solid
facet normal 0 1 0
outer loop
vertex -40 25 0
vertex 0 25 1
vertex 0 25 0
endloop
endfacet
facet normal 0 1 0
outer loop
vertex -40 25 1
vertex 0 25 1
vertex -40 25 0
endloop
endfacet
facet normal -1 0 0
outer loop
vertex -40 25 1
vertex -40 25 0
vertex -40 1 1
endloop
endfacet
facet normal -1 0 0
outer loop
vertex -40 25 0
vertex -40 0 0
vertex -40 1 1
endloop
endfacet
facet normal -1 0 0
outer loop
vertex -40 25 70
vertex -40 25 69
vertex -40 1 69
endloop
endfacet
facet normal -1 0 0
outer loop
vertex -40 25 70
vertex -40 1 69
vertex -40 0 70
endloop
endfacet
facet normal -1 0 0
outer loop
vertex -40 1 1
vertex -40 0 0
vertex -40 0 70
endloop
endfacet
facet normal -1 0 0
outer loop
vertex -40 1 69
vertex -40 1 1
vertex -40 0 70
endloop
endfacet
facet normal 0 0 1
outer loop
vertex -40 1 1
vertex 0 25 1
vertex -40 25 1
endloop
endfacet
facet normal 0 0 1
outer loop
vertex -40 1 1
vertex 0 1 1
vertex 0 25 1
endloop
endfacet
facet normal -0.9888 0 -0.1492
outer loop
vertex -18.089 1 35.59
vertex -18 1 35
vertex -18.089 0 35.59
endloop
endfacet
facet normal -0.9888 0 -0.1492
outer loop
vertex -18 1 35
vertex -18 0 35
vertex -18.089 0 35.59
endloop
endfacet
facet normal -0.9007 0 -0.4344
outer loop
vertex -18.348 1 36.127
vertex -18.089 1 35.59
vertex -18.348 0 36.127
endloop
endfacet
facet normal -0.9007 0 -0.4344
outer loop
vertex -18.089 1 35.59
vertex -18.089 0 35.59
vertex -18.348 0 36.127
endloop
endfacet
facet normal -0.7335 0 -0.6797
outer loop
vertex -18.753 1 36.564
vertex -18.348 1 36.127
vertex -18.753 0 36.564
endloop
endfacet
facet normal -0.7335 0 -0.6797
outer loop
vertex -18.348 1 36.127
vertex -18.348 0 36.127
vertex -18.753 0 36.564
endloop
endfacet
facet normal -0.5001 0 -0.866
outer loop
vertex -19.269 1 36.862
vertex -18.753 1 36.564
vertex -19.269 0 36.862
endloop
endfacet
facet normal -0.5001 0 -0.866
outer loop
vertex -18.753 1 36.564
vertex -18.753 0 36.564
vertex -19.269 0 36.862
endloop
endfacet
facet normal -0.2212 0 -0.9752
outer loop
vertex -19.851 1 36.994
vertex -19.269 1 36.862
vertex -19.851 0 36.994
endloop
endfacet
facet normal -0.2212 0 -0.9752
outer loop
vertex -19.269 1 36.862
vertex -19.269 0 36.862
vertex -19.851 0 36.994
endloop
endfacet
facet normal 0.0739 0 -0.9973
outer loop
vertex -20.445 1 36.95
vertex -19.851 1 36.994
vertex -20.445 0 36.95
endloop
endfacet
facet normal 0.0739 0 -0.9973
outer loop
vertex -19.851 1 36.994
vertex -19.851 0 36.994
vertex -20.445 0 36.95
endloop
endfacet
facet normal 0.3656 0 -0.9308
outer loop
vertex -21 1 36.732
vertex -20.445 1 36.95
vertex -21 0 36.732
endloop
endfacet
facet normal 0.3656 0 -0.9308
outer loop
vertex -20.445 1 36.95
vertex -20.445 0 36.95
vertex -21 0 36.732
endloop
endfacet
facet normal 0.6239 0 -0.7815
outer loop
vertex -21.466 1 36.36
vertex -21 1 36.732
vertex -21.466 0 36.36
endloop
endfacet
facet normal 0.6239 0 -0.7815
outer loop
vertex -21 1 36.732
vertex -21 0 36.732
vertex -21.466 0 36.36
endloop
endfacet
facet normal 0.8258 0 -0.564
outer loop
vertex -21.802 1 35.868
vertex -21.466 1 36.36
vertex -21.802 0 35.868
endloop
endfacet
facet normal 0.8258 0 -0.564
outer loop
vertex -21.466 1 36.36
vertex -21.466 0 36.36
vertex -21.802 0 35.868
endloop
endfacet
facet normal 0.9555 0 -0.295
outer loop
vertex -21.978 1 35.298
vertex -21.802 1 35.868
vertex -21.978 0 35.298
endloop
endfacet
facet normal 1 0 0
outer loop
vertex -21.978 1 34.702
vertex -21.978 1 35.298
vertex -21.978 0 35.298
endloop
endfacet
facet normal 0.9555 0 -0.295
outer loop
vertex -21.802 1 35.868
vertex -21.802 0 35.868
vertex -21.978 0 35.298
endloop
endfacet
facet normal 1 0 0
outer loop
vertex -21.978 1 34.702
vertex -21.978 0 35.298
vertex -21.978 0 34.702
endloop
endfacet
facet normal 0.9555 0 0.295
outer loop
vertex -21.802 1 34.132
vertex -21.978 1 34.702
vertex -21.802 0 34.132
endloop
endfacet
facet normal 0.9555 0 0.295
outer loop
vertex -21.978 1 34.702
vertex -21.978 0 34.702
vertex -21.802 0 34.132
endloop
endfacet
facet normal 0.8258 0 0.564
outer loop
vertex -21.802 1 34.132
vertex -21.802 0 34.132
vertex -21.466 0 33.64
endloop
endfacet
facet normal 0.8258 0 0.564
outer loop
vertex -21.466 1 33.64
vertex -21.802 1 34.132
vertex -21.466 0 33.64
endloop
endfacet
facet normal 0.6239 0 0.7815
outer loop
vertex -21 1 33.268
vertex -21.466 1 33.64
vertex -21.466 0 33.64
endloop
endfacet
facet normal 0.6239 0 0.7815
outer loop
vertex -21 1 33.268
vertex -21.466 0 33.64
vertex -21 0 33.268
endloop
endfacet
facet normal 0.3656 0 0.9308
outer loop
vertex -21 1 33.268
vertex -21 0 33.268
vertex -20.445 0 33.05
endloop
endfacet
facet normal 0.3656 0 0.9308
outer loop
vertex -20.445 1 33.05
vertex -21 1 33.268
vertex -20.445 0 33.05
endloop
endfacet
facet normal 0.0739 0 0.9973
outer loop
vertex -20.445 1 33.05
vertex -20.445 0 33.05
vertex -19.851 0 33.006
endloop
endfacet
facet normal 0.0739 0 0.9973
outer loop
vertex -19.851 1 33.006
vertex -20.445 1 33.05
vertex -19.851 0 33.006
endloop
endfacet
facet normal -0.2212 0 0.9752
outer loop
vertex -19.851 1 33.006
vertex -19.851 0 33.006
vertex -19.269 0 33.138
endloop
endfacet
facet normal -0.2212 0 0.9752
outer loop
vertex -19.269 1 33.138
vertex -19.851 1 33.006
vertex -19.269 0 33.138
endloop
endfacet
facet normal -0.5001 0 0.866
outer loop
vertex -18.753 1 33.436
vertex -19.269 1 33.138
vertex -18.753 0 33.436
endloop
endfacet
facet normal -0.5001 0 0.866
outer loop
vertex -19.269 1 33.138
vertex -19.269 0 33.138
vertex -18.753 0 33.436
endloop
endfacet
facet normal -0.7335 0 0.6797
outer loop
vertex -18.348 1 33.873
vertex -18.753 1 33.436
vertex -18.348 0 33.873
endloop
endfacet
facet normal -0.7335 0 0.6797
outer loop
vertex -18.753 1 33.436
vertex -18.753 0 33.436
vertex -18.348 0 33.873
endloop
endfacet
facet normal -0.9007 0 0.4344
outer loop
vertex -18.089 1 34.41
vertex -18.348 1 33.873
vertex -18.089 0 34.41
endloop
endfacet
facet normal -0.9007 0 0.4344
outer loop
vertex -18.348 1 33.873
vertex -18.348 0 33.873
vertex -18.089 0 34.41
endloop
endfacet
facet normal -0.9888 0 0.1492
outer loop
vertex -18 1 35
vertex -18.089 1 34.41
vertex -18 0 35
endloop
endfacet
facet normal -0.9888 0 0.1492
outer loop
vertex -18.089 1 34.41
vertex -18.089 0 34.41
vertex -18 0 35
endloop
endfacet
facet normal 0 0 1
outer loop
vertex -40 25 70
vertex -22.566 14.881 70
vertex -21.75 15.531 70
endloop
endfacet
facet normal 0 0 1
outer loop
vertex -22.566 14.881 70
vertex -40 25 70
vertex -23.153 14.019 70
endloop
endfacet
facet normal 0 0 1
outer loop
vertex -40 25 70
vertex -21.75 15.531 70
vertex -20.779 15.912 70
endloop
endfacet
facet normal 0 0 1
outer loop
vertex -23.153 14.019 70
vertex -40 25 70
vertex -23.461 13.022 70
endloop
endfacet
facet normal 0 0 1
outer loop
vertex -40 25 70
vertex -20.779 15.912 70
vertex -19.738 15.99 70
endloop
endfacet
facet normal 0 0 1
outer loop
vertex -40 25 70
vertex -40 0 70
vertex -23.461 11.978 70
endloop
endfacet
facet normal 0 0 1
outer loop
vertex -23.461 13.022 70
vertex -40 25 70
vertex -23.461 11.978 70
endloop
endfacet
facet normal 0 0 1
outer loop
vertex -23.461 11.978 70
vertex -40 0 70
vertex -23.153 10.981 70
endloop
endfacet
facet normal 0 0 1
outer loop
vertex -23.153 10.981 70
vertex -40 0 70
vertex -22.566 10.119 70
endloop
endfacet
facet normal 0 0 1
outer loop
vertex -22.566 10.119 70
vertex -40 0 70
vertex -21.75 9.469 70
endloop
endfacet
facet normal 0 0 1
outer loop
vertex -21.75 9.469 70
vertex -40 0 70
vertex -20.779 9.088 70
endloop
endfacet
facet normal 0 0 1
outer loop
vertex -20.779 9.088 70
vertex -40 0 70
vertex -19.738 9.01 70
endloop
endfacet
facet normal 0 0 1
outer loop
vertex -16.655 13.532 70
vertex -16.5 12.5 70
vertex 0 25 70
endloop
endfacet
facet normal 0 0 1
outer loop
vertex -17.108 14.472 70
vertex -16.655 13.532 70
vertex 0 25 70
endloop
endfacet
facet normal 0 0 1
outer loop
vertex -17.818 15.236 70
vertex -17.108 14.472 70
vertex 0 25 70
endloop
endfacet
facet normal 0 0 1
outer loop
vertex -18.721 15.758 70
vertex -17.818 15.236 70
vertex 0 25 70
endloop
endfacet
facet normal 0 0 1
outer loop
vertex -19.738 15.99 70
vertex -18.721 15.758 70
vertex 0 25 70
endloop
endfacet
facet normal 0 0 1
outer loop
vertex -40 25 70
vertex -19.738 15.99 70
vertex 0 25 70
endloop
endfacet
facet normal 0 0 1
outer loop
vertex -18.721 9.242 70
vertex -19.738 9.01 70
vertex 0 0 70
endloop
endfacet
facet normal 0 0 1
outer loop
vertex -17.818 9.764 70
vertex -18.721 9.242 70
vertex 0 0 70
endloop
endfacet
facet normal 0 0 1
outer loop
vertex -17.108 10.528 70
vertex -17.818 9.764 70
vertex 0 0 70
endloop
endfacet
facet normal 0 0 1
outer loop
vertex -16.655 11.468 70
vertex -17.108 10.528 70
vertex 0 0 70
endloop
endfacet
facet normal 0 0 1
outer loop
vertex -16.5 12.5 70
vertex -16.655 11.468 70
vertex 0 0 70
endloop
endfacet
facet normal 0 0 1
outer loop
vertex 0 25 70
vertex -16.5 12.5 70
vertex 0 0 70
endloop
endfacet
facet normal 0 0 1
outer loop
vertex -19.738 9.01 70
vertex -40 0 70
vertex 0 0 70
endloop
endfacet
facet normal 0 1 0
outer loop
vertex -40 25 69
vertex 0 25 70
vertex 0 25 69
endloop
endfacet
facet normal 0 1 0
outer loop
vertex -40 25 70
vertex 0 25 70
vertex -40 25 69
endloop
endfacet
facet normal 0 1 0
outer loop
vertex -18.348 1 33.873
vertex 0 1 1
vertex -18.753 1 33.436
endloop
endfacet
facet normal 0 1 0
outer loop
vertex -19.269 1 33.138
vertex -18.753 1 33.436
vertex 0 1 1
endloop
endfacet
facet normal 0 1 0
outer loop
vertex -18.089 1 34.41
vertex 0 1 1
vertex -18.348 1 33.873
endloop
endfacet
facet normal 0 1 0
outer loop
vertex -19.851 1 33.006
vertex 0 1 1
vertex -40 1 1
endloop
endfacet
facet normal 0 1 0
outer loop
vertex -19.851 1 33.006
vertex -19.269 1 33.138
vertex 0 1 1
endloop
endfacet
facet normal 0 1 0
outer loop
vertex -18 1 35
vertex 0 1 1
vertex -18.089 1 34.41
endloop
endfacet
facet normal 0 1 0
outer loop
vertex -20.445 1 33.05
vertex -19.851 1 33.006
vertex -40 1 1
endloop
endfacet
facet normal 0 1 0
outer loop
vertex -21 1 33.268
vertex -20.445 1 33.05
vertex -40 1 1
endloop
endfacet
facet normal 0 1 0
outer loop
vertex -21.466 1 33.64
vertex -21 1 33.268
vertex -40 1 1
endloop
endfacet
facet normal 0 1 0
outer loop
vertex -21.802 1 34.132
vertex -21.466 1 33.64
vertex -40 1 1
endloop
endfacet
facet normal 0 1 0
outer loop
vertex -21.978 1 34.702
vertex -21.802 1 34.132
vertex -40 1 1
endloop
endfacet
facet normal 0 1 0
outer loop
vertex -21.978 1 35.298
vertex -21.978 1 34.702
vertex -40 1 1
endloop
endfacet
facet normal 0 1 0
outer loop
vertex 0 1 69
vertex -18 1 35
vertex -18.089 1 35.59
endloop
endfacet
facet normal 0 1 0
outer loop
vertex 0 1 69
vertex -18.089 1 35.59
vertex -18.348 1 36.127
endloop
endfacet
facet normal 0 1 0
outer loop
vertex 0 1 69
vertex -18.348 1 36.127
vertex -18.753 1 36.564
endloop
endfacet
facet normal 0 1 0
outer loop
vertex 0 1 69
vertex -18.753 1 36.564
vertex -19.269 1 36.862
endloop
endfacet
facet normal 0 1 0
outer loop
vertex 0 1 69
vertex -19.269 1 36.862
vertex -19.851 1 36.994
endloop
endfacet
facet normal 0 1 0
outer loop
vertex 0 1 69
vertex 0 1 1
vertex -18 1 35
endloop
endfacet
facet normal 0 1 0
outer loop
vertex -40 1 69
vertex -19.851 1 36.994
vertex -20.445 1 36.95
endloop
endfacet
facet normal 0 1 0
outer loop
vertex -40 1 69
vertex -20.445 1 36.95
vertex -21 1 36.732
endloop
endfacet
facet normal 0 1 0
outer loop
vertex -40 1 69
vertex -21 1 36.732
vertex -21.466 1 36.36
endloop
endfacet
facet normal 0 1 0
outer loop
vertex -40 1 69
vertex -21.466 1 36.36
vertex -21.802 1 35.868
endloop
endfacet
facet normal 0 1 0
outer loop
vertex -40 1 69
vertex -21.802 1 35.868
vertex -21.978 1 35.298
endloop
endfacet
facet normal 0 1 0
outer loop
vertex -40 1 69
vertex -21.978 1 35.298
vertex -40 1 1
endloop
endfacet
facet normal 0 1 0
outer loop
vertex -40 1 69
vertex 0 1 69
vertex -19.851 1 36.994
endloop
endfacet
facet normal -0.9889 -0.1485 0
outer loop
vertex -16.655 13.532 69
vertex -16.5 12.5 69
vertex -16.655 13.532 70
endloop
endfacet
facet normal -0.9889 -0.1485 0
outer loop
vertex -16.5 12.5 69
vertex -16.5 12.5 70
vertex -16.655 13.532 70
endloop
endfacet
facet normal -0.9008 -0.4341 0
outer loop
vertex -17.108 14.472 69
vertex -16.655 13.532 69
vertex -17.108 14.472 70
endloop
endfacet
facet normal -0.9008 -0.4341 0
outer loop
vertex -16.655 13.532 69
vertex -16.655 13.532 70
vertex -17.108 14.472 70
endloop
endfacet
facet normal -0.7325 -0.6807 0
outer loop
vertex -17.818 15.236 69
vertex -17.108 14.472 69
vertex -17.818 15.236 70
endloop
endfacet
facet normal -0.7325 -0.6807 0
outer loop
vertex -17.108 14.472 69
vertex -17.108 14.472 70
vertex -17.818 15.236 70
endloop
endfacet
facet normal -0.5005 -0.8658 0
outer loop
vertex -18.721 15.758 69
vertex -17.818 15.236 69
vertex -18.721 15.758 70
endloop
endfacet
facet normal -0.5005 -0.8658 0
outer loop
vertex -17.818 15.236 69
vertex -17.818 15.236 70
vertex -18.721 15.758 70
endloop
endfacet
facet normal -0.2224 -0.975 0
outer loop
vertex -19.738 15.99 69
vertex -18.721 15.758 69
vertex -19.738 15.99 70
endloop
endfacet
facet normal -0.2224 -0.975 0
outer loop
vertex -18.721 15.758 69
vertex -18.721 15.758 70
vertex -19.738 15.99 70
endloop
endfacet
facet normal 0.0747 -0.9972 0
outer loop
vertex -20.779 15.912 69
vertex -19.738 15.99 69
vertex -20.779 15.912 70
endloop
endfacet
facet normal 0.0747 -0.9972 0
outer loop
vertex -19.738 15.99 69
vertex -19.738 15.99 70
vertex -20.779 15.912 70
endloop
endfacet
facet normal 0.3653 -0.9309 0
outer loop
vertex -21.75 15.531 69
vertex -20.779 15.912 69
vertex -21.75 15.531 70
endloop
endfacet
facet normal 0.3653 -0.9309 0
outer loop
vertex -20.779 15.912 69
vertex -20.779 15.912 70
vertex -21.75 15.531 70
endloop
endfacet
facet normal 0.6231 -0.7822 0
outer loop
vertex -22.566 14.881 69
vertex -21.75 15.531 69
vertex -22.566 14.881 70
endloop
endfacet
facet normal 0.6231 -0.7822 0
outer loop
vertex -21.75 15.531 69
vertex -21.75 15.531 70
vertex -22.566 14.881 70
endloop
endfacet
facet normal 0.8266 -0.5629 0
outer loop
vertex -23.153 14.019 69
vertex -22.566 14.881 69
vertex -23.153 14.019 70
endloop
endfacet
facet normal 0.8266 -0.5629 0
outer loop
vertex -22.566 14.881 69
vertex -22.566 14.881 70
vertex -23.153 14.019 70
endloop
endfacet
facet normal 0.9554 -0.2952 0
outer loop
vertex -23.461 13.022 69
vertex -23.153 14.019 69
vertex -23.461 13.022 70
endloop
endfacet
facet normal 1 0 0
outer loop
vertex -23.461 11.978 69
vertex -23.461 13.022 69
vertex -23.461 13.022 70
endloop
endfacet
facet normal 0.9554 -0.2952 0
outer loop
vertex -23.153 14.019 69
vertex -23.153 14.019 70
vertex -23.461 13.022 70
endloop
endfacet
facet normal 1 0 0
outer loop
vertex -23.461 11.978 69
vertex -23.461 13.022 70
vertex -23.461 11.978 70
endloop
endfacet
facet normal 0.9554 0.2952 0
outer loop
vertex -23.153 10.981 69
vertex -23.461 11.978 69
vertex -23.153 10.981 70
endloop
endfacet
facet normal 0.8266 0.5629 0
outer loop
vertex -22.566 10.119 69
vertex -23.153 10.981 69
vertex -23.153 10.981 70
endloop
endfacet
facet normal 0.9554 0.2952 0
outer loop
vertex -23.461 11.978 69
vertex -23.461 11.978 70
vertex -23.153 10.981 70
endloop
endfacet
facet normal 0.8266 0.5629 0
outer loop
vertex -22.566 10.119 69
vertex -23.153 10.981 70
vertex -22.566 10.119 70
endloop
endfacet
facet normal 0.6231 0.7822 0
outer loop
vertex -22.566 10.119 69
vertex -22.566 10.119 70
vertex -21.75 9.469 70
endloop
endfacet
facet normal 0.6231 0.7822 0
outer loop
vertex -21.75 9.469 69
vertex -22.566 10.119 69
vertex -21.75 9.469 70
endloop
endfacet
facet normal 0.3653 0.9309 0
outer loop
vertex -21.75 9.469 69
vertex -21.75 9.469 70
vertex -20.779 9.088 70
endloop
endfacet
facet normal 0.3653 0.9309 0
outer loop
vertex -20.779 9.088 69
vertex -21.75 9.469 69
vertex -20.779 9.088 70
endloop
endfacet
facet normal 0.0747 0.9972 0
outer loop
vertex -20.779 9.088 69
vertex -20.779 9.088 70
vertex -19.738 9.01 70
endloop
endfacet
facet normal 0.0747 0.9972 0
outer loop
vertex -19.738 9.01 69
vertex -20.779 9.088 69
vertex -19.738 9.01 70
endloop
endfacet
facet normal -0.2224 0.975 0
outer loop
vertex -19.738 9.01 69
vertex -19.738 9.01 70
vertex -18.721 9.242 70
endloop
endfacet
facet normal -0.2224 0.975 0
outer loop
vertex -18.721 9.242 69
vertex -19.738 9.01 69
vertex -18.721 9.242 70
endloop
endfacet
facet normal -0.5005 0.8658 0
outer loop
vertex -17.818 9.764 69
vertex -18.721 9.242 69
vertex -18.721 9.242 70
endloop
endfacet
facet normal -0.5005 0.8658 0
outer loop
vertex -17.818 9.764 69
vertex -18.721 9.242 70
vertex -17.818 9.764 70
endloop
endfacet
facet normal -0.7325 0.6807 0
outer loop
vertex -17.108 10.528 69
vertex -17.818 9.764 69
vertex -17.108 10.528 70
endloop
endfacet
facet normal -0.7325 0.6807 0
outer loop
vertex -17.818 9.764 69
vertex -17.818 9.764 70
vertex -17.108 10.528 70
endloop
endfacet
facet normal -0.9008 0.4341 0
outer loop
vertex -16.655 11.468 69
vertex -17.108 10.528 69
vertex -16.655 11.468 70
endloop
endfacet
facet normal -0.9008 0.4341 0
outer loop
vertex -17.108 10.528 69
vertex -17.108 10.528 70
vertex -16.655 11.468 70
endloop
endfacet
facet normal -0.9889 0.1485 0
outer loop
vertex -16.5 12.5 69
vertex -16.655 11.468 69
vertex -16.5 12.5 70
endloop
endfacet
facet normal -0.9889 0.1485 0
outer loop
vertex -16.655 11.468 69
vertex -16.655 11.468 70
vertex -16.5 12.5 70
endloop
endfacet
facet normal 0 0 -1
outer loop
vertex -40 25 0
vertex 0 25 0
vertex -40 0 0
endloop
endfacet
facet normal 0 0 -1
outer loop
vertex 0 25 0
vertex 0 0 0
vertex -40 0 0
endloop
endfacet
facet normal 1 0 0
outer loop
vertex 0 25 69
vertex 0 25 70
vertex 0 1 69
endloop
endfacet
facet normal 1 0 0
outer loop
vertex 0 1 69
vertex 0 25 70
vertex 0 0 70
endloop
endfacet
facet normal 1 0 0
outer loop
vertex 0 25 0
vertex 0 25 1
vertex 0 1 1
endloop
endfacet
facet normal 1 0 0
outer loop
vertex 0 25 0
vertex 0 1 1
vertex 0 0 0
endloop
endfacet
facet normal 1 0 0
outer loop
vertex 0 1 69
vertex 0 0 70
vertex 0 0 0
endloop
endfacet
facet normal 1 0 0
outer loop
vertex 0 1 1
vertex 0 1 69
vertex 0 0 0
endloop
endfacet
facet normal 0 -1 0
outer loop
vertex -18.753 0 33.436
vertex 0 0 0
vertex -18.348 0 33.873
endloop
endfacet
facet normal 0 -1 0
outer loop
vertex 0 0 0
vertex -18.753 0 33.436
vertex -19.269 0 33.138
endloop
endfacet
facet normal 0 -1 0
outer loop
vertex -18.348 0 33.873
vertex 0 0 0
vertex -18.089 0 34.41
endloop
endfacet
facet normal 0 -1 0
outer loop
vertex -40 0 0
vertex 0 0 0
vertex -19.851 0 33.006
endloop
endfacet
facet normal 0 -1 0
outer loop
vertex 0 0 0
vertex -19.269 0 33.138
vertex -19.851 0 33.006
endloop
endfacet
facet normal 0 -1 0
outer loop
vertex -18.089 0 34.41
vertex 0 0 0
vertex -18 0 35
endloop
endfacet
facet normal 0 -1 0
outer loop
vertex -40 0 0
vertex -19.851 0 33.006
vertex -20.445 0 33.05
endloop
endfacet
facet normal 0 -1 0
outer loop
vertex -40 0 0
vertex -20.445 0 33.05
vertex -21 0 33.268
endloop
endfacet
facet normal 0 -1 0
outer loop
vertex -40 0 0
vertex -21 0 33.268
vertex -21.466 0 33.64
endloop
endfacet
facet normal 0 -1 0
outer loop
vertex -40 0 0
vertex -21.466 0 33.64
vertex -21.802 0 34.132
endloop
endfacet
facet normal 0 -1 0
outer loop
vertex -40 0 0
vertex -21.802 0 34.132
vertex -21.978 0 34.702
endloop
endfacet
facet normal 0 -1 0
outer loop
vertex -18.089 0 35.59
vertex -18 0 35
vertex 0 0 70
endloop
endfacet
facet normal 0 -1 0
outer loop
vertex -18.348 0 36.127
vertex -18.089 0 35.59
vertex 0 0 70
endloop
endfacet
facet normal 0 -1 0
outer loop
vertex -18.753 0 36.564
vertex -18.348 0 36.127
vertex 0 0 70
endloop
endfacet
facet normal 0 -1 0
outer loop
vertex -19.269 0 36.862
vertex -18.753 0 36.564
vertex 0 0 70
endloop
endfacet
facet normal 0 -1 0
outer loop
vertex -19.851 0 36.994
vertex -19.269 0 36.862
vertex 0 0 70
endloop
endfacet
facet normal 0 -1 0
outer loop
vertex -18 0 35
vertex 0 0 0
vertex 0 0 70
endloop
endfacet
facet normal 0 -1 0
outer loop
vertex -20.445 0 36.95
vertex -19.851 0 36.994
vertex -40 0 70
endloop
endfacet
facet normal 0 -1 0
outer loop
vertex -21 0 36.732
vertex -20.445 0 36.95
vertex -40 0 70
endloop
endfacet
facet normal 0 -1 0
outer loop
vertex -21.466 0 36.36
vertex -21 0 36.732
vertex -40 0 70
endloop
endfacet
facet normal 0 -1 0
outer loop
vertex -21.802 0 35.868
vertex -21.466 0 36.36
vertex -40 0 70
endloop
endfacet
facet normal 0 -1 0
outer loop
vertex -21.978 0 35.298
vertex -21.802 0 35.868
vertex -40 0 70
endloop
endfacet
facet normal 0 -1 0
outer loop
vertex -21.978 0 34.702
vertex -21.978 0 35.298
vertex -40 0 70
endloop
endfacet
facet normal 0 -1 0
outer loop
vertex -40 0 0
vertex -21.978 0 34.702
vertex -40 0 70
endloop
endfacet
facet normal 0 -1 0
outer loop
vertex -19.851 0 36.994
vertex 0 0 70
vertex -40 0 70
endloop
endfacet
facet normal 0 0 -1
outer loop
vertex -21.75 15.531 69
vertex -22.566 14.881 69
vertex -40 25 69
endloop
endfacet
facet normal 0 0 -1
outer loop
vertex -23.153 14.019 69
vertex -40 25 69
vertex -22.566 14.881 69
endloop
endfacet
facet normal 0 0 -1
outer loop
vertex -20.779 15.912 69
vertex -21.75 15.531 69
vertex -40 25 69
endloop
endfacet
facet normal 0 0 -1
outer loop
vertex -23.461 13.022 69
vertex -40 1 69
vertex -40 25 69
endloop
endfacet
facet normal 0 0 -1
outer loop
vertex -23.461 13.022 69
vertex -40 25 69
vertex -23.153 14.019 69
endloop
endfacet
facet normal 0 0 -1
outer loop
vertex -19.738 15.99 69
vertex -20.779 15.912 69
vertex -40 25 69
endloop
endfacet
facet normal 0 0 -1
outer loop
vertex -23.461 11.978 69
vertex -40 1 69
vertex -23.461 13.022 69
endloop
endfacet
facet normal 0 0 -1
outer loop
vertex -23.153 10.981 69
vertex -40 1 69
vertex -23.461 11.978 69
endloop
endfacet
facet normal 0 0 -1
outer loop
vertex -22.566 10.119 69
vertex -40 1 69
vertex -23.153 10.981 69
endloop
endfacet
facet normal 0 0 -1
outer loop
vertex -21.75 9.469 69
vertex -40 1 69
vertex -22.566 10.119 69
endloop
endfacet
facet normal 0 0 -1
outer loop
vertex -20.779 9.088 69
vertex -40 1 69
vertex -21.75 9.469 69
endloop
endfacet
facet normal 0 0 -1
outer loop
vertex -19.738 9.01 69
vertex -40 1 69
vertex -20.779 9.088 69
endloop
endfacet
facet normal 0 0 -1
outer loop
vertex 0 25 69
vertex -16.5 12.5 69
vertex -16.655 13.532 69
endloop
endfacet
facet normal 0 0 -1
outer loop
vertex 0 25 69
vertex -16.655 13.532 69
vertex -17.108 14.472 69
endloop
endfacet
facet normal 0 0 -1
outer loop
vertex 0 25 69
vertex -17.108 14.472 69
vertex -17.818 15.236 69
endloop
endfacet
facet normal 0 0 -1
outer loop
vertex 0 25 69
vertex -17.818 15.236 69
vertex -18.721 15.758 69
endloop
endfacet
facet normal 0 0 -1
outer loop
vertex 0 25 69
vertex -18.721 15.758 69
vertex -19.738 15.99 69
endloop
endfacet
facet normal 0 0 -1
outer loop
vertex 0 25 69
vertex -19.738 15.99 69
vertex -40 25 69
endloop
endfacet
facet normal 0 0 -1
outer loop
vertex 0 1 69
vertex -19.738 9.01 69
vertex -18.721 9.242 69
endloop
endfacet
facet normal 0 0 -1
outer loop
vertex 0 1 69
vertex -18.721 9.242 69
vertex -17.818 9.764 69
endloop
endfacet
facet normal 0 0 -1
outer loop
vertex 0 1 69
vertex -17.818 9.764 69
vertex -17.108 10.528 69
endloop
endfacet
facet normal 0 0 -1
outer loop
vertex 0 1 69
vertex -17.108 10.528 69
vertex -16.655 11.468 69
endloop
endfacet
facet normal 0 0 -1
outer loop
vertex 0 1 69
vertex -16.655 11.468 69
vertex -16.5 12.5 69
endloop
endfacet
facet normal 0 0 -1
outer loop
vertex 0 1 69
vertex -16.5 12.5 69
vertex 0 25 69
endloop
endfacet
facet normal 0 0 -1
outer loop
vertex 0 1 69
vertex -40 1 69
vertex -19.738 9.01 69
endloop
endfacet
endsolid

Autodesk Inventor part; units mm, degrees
ref_plane "YZ Plane" through (0, 0, 0) normal (1, 0, 0) x (0, 1, 0)
ref_plane "XZ Plane" through (0, 0, 0) normal (0, 1, 0) x (-1, 0, 0)
ref_plane "XY Plane" through (0, 0, 0) normal (0, 0, 1) x (1, 0, 0)
sketch "Sketch6" plane through (0, 0, 0) normal (0, 1, 0) x (-1, 0, 0)
  line L0 (0, 0) -> (40, 0)
  line L1 (40, 0) -> (40, 70)
  line L2 (40, 70) -> (0, 70)
  line L3 (0, 70) -> (0, 0)
  dimension "d10" = 40
  dimension "d11" = 70
extrude "Extrusion3" add sketch "Sketch6" along normal blind 25
shell "Shell1" thickness 1 removed faces 3 at (0, 8.3333, 46.6667) at (-40, 8.3333, 23.3333) at (-26.6667, 25, 23.3333)
sketch "Sketch7" plane through (-40, 0, 70) normal (0, 0, 1) x (1, 0, 0)
  line L0 (0, 25) -> (0, 1) projected
  line L1 (40, 0) -> (0, 0) projected
  line L2 (40, 1) -> (40, 25) projected
  circle A0 centre (20, 12.5) radius 3.5
  dimension "d15" = 7
extrude "Extrusion4" cut sketch "Sketch7" against normal blind 1
sketch "Sketch8" plane through (0, 0, 0) normal (0, -1, 0) x (1, 0, 0)
  line L0 (-40, 70) -> (0, 70) projected
  line L1 (0, 0) -> (-40, 0) projected
  circle A0 centre (-20, 35) radius 2
  dimension "d18" = 4
extrude "Extrusion5" cut sketch "Sketch8" against normal blind 1
properties part number "MAN_SERVO_HANDLER" material "ABS Plastic"
